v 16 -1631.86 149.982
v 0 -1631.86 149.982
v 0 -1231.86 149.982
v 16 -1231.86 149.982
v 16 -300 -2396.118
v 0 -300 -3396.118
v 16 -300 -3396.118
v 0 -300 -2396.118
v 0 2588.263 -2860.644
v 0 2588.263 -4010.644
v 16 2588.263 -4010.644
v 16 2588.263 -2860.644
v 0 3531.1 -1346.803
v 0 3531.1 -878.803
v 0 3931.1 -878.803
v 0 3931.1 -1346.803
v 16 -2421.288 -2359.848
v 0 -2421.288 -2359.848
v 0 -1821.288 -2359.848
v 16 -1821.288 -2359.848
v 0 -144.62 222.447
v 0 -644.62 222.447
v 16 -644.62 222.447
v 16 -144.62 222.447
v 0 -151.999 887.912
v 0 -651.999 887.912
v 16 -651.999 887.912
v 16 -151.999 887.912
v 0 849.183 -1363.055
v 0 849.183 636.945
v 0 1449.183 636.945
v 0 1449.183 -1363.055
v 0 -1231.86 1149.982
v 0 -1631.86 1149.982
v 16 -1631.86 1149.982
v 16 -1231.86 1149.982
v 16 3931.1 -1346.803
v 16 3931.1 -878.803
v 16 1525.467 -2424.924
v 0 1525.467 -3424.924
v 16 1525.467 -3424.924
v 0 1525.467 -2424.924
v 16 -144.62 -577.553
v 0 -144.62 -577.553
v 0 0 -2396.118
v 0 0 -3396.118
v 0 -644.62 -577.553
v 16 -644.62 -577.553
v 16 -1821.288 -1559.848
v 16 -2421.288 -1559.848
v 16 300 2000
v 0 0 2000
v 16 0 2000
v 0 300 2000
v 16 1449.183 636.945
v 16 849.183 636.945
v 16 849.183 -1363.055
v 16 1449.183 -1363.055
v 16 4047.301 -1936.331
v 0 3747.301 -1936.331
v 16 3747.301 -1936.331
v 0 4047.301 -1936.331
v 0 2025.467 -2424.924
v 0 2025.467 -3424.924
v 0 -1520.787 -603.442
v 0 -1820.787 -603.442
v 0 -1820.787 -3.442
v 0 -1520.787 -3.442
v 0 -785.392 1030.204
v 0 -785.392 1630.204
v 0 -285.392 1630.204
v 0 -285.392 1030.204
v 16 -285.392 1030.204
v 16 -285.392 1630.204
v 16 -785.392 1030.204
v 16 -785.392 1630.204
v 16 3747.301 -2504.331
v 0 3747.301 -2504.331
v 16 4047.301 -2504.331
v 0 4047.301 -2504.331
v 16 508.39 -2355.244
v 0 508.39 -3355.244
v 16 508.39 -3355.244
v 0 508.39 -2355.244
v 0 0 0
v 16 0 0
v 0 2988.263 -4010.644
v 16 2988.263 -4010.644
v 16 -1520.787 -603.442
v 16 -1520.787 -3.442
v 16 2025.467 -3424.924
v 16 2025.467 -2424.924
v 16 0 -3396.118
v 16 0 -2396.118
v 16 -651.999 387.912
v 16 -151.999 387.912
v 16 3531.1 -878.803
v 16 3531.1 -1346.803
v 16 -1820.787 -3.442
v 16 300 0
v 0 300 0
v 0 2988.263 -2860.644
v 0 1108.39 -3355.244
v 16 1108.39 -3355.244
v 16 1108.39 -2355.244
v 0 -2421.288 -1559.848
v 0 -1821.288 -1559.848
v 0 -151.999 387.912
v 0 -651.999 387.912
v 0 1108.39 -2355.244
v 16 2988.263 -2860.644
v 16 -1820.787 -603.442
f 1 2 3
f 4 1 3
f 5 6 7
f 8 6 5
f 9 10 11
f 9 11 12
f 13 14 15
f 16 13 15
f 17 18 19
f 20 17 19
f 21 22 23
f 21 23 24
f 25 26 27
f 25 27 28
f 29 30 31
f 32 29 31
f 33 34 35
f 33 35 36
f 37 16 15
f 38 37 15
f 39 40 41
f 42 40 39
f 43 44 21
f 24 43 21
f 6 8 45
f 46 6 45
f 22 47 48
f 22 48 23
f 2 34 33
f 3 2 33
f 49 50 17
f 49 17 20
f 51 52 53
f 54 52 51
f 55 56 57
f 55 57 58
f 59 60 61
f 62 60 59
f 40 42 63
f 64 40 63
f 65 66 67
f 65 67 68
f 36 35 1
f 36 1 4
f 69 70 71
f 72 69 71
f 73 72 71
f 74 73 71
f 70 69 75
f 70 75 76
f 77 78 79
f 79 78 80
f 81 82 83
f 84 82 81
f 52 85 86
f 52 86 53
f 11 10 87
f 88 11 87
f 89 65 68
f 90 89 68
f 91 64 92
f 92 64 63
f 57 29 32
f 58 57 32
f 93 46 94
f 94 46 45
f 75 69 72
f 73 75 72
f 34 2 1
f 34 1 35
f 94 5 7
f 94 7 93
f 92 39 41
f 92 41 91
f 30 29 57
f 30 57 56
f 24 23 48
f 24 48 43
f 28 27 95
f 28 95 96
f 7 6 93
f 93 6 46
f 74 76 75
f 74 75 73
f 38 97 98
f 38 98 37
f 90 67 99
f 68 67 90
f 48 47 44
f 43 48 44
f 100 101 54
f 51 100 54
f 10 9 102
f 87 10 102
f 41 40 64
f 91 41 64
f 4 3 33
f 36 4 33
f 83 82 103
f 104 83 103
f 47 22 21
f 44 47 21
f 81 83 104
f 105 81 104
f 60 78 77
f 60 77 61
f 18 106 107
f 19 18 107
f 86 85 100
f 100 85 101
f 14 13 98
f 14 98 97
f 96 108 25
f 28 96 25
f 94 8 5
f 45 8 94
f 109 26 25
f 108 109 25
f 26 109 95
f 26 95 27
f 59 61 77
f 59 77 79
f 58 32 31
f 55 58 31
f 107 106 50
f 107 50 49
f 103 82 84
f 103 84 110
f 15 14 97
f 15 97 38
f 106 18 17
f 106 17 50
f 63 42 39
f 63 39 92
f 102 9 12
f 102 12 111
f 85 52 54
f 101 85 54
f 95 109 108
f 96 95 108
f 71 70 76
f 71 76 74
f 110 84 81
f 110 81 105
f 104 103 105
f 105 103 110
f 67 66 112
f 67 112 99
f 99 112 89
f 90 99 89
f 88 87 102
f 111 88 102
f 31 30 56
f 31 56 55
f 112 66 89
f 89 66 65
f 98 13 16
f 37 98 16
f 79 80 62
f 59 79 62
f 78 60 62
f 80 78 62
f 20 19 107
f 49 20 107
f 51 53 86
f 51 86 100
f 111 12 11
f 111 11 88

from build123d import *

# Parameters (mm, degrees)
F0_W      = 300
F0_H      = 2000
F1_DEPTH  = 16
F2_W      = 600
F2_H      = 2000
F3_DEPTH  = 16
F4_W      = 500
F4_H      = 800
F5_DEPTH  = 16
F6_W      = 500
F6_H      = 500
F7_DEPTH  = 16
F8_W      = 500
F8_H      = 600
F9_DEPTH  = 16
F10_W     = 300
F10_H     = 600
F11_DEPTH = 16
F12_W     = 400
F12_H     = 1000
F13_DEPTH = 16
F14_W     = 300
F14_H     = 1000
F15_DEPTH = 16
F16_W     = 500
F16_H     = 1000
F17_DEPTH = 16
F18_W     = 600
F18_H     = 1000
F19_DEPTH = 16
F20_W     = 600
F20_H     = 800
F21_DEPTH = 16
F22_W     = 400
F22_H     = 468
F23_DEPTH = 16
F24_W     = 300
F24_H     = 568
F25_DEPTH = 16
F26_W     = 400
F26_H     = 1150
F27_DEPTH = 16


with BuildPart() as f1:
    # F0 (on Right) → F1 (new body)
    with BuildSketch(Plane.YZ):
        with Locations((150, 1000)):
            Rectangle(F0_W, F0_H)
    extrude(amount=F1_DEPTH)


with BuildPart() as f3:
    # F2 (on Right) → F3 (new body)
    with BuildSketch(Plane.YZ):
        with Locations((1149.183393, -363.05549)):
            Rectangle(F2_W, F2_H)
    extrude(amount=F3_DEPTH)


with BuildPart() as f5:
    # F4 (on Right) → F5 (new body)
    with BuildSketch(Plane.YZ):
        with Locations((-394.620359, -177.552847)):
            Rectangle(F4_W, F4_H)
    extrude(amount=F5_DEPTH)


with BuildPart() as f7:
    # F6 (on Right) → F7 (new body)
    with BuildSketch(Plane.YZ):
        with Locations((-401.999153, 637.911748)):
            Rectangle(F6_W, F6_H)
    extrude(amount=F7_DEPTH)


with BuildPart() as f9:
    # F8 (on Right) → F9 (new body)
    with BuildSketch(Plane.YZ):
        with Locations((-535.392076, 1330.203979)):
            Rectangle(F8_W, F8_H)
    extrude(amount=F9_DEPTH)


with BuildPart() as f11:
    # F10 (on Right) → F11 (new body)
    with BuildSketch(Plane.YZ):
        with Locations((-1670.787215, -303.442387)):
            Rectangle(F10_W, F10_H)
    extrude(amount=F11_DEPTH)


with BuildPart() as f13:
    # F12 (on Right) → F13 (new body)
    with BuildSketch(Plane.YZ):
        with Locations((-1431.859701, 649.981737)):
            Rectangle(F12_W, F12_H)
    extrude(amount=F13_DEPTH)


with BuildPart() as f15:
    # F14 (on Right) → F15 (new body)
    with BuildSketch(Plane.YZ):
        with Locations((-150, -2896.117578)):
            Rectangle(F14_W, F14_H)
    extrude(amount=F15_DEPTH)


with BuildPart() as f17:
    # F16 (on Right) → F17 (new body)
    with BuildSketch(Plane.YZ):
        with Locations((1775.467287, -2924.923539)):
            Rectangle(F16_W, F16_H)
    extrude(amount=F17_DEPTH)


with BuildPart() as f19:
    # F18 (on Right) → F19 (new body)
    with BuildSketch(Plane.YZ):
        with Locations((808.389788, -2855.244279)):
            Rectangle(F18_W, F18_H)
    extrude(amount=F19_DEPTH)


with BuildPart() as f21:
    # F20 (on Right) → F21 (new body)
    with BuildSketch(Plane.YZ):
        with Locations((-2121.28849, -1959.848022)):
            Rectangle(F20_W, F20_H)
    extrude(amount=F21_DEPTH)


with BuildPart() as f23:
    # F22 (on Right) → F23 (new body)
    with BuildSketch(Plane.YZ):
        with Locations((3731.100465, -1112.803333)):
            Rectangle(F22_W, F22_H)
    extrude(amount=F23_DEPTH)


with BuildPart() as f25:
    # F24 (on Right) → F25 (new body)
    with BuildSketch(Plane.YZ):
        with Locations((3897.301314, -2220.33145)):
            Rectangle(F24_W, F24_H)
    extrude(amount=F25_DEPTH)


with BuildPart() as f27:
    # F26 (on Right) → F27 (new body)
    with BuildSketch(Plane.YZ):
        with Locations((2788.262796, -3435.644436)):
            Rectangle(F26_W, F26_H)
    extrude(amount=F27_DEPTH)


solid = Compound([f1.part, f3.part, f5.part, f7.part, f9.part, f11.part, f13.part, f15.part, f17.part, f19.part, f21.part, f23.part, f25.part, f27.part])
